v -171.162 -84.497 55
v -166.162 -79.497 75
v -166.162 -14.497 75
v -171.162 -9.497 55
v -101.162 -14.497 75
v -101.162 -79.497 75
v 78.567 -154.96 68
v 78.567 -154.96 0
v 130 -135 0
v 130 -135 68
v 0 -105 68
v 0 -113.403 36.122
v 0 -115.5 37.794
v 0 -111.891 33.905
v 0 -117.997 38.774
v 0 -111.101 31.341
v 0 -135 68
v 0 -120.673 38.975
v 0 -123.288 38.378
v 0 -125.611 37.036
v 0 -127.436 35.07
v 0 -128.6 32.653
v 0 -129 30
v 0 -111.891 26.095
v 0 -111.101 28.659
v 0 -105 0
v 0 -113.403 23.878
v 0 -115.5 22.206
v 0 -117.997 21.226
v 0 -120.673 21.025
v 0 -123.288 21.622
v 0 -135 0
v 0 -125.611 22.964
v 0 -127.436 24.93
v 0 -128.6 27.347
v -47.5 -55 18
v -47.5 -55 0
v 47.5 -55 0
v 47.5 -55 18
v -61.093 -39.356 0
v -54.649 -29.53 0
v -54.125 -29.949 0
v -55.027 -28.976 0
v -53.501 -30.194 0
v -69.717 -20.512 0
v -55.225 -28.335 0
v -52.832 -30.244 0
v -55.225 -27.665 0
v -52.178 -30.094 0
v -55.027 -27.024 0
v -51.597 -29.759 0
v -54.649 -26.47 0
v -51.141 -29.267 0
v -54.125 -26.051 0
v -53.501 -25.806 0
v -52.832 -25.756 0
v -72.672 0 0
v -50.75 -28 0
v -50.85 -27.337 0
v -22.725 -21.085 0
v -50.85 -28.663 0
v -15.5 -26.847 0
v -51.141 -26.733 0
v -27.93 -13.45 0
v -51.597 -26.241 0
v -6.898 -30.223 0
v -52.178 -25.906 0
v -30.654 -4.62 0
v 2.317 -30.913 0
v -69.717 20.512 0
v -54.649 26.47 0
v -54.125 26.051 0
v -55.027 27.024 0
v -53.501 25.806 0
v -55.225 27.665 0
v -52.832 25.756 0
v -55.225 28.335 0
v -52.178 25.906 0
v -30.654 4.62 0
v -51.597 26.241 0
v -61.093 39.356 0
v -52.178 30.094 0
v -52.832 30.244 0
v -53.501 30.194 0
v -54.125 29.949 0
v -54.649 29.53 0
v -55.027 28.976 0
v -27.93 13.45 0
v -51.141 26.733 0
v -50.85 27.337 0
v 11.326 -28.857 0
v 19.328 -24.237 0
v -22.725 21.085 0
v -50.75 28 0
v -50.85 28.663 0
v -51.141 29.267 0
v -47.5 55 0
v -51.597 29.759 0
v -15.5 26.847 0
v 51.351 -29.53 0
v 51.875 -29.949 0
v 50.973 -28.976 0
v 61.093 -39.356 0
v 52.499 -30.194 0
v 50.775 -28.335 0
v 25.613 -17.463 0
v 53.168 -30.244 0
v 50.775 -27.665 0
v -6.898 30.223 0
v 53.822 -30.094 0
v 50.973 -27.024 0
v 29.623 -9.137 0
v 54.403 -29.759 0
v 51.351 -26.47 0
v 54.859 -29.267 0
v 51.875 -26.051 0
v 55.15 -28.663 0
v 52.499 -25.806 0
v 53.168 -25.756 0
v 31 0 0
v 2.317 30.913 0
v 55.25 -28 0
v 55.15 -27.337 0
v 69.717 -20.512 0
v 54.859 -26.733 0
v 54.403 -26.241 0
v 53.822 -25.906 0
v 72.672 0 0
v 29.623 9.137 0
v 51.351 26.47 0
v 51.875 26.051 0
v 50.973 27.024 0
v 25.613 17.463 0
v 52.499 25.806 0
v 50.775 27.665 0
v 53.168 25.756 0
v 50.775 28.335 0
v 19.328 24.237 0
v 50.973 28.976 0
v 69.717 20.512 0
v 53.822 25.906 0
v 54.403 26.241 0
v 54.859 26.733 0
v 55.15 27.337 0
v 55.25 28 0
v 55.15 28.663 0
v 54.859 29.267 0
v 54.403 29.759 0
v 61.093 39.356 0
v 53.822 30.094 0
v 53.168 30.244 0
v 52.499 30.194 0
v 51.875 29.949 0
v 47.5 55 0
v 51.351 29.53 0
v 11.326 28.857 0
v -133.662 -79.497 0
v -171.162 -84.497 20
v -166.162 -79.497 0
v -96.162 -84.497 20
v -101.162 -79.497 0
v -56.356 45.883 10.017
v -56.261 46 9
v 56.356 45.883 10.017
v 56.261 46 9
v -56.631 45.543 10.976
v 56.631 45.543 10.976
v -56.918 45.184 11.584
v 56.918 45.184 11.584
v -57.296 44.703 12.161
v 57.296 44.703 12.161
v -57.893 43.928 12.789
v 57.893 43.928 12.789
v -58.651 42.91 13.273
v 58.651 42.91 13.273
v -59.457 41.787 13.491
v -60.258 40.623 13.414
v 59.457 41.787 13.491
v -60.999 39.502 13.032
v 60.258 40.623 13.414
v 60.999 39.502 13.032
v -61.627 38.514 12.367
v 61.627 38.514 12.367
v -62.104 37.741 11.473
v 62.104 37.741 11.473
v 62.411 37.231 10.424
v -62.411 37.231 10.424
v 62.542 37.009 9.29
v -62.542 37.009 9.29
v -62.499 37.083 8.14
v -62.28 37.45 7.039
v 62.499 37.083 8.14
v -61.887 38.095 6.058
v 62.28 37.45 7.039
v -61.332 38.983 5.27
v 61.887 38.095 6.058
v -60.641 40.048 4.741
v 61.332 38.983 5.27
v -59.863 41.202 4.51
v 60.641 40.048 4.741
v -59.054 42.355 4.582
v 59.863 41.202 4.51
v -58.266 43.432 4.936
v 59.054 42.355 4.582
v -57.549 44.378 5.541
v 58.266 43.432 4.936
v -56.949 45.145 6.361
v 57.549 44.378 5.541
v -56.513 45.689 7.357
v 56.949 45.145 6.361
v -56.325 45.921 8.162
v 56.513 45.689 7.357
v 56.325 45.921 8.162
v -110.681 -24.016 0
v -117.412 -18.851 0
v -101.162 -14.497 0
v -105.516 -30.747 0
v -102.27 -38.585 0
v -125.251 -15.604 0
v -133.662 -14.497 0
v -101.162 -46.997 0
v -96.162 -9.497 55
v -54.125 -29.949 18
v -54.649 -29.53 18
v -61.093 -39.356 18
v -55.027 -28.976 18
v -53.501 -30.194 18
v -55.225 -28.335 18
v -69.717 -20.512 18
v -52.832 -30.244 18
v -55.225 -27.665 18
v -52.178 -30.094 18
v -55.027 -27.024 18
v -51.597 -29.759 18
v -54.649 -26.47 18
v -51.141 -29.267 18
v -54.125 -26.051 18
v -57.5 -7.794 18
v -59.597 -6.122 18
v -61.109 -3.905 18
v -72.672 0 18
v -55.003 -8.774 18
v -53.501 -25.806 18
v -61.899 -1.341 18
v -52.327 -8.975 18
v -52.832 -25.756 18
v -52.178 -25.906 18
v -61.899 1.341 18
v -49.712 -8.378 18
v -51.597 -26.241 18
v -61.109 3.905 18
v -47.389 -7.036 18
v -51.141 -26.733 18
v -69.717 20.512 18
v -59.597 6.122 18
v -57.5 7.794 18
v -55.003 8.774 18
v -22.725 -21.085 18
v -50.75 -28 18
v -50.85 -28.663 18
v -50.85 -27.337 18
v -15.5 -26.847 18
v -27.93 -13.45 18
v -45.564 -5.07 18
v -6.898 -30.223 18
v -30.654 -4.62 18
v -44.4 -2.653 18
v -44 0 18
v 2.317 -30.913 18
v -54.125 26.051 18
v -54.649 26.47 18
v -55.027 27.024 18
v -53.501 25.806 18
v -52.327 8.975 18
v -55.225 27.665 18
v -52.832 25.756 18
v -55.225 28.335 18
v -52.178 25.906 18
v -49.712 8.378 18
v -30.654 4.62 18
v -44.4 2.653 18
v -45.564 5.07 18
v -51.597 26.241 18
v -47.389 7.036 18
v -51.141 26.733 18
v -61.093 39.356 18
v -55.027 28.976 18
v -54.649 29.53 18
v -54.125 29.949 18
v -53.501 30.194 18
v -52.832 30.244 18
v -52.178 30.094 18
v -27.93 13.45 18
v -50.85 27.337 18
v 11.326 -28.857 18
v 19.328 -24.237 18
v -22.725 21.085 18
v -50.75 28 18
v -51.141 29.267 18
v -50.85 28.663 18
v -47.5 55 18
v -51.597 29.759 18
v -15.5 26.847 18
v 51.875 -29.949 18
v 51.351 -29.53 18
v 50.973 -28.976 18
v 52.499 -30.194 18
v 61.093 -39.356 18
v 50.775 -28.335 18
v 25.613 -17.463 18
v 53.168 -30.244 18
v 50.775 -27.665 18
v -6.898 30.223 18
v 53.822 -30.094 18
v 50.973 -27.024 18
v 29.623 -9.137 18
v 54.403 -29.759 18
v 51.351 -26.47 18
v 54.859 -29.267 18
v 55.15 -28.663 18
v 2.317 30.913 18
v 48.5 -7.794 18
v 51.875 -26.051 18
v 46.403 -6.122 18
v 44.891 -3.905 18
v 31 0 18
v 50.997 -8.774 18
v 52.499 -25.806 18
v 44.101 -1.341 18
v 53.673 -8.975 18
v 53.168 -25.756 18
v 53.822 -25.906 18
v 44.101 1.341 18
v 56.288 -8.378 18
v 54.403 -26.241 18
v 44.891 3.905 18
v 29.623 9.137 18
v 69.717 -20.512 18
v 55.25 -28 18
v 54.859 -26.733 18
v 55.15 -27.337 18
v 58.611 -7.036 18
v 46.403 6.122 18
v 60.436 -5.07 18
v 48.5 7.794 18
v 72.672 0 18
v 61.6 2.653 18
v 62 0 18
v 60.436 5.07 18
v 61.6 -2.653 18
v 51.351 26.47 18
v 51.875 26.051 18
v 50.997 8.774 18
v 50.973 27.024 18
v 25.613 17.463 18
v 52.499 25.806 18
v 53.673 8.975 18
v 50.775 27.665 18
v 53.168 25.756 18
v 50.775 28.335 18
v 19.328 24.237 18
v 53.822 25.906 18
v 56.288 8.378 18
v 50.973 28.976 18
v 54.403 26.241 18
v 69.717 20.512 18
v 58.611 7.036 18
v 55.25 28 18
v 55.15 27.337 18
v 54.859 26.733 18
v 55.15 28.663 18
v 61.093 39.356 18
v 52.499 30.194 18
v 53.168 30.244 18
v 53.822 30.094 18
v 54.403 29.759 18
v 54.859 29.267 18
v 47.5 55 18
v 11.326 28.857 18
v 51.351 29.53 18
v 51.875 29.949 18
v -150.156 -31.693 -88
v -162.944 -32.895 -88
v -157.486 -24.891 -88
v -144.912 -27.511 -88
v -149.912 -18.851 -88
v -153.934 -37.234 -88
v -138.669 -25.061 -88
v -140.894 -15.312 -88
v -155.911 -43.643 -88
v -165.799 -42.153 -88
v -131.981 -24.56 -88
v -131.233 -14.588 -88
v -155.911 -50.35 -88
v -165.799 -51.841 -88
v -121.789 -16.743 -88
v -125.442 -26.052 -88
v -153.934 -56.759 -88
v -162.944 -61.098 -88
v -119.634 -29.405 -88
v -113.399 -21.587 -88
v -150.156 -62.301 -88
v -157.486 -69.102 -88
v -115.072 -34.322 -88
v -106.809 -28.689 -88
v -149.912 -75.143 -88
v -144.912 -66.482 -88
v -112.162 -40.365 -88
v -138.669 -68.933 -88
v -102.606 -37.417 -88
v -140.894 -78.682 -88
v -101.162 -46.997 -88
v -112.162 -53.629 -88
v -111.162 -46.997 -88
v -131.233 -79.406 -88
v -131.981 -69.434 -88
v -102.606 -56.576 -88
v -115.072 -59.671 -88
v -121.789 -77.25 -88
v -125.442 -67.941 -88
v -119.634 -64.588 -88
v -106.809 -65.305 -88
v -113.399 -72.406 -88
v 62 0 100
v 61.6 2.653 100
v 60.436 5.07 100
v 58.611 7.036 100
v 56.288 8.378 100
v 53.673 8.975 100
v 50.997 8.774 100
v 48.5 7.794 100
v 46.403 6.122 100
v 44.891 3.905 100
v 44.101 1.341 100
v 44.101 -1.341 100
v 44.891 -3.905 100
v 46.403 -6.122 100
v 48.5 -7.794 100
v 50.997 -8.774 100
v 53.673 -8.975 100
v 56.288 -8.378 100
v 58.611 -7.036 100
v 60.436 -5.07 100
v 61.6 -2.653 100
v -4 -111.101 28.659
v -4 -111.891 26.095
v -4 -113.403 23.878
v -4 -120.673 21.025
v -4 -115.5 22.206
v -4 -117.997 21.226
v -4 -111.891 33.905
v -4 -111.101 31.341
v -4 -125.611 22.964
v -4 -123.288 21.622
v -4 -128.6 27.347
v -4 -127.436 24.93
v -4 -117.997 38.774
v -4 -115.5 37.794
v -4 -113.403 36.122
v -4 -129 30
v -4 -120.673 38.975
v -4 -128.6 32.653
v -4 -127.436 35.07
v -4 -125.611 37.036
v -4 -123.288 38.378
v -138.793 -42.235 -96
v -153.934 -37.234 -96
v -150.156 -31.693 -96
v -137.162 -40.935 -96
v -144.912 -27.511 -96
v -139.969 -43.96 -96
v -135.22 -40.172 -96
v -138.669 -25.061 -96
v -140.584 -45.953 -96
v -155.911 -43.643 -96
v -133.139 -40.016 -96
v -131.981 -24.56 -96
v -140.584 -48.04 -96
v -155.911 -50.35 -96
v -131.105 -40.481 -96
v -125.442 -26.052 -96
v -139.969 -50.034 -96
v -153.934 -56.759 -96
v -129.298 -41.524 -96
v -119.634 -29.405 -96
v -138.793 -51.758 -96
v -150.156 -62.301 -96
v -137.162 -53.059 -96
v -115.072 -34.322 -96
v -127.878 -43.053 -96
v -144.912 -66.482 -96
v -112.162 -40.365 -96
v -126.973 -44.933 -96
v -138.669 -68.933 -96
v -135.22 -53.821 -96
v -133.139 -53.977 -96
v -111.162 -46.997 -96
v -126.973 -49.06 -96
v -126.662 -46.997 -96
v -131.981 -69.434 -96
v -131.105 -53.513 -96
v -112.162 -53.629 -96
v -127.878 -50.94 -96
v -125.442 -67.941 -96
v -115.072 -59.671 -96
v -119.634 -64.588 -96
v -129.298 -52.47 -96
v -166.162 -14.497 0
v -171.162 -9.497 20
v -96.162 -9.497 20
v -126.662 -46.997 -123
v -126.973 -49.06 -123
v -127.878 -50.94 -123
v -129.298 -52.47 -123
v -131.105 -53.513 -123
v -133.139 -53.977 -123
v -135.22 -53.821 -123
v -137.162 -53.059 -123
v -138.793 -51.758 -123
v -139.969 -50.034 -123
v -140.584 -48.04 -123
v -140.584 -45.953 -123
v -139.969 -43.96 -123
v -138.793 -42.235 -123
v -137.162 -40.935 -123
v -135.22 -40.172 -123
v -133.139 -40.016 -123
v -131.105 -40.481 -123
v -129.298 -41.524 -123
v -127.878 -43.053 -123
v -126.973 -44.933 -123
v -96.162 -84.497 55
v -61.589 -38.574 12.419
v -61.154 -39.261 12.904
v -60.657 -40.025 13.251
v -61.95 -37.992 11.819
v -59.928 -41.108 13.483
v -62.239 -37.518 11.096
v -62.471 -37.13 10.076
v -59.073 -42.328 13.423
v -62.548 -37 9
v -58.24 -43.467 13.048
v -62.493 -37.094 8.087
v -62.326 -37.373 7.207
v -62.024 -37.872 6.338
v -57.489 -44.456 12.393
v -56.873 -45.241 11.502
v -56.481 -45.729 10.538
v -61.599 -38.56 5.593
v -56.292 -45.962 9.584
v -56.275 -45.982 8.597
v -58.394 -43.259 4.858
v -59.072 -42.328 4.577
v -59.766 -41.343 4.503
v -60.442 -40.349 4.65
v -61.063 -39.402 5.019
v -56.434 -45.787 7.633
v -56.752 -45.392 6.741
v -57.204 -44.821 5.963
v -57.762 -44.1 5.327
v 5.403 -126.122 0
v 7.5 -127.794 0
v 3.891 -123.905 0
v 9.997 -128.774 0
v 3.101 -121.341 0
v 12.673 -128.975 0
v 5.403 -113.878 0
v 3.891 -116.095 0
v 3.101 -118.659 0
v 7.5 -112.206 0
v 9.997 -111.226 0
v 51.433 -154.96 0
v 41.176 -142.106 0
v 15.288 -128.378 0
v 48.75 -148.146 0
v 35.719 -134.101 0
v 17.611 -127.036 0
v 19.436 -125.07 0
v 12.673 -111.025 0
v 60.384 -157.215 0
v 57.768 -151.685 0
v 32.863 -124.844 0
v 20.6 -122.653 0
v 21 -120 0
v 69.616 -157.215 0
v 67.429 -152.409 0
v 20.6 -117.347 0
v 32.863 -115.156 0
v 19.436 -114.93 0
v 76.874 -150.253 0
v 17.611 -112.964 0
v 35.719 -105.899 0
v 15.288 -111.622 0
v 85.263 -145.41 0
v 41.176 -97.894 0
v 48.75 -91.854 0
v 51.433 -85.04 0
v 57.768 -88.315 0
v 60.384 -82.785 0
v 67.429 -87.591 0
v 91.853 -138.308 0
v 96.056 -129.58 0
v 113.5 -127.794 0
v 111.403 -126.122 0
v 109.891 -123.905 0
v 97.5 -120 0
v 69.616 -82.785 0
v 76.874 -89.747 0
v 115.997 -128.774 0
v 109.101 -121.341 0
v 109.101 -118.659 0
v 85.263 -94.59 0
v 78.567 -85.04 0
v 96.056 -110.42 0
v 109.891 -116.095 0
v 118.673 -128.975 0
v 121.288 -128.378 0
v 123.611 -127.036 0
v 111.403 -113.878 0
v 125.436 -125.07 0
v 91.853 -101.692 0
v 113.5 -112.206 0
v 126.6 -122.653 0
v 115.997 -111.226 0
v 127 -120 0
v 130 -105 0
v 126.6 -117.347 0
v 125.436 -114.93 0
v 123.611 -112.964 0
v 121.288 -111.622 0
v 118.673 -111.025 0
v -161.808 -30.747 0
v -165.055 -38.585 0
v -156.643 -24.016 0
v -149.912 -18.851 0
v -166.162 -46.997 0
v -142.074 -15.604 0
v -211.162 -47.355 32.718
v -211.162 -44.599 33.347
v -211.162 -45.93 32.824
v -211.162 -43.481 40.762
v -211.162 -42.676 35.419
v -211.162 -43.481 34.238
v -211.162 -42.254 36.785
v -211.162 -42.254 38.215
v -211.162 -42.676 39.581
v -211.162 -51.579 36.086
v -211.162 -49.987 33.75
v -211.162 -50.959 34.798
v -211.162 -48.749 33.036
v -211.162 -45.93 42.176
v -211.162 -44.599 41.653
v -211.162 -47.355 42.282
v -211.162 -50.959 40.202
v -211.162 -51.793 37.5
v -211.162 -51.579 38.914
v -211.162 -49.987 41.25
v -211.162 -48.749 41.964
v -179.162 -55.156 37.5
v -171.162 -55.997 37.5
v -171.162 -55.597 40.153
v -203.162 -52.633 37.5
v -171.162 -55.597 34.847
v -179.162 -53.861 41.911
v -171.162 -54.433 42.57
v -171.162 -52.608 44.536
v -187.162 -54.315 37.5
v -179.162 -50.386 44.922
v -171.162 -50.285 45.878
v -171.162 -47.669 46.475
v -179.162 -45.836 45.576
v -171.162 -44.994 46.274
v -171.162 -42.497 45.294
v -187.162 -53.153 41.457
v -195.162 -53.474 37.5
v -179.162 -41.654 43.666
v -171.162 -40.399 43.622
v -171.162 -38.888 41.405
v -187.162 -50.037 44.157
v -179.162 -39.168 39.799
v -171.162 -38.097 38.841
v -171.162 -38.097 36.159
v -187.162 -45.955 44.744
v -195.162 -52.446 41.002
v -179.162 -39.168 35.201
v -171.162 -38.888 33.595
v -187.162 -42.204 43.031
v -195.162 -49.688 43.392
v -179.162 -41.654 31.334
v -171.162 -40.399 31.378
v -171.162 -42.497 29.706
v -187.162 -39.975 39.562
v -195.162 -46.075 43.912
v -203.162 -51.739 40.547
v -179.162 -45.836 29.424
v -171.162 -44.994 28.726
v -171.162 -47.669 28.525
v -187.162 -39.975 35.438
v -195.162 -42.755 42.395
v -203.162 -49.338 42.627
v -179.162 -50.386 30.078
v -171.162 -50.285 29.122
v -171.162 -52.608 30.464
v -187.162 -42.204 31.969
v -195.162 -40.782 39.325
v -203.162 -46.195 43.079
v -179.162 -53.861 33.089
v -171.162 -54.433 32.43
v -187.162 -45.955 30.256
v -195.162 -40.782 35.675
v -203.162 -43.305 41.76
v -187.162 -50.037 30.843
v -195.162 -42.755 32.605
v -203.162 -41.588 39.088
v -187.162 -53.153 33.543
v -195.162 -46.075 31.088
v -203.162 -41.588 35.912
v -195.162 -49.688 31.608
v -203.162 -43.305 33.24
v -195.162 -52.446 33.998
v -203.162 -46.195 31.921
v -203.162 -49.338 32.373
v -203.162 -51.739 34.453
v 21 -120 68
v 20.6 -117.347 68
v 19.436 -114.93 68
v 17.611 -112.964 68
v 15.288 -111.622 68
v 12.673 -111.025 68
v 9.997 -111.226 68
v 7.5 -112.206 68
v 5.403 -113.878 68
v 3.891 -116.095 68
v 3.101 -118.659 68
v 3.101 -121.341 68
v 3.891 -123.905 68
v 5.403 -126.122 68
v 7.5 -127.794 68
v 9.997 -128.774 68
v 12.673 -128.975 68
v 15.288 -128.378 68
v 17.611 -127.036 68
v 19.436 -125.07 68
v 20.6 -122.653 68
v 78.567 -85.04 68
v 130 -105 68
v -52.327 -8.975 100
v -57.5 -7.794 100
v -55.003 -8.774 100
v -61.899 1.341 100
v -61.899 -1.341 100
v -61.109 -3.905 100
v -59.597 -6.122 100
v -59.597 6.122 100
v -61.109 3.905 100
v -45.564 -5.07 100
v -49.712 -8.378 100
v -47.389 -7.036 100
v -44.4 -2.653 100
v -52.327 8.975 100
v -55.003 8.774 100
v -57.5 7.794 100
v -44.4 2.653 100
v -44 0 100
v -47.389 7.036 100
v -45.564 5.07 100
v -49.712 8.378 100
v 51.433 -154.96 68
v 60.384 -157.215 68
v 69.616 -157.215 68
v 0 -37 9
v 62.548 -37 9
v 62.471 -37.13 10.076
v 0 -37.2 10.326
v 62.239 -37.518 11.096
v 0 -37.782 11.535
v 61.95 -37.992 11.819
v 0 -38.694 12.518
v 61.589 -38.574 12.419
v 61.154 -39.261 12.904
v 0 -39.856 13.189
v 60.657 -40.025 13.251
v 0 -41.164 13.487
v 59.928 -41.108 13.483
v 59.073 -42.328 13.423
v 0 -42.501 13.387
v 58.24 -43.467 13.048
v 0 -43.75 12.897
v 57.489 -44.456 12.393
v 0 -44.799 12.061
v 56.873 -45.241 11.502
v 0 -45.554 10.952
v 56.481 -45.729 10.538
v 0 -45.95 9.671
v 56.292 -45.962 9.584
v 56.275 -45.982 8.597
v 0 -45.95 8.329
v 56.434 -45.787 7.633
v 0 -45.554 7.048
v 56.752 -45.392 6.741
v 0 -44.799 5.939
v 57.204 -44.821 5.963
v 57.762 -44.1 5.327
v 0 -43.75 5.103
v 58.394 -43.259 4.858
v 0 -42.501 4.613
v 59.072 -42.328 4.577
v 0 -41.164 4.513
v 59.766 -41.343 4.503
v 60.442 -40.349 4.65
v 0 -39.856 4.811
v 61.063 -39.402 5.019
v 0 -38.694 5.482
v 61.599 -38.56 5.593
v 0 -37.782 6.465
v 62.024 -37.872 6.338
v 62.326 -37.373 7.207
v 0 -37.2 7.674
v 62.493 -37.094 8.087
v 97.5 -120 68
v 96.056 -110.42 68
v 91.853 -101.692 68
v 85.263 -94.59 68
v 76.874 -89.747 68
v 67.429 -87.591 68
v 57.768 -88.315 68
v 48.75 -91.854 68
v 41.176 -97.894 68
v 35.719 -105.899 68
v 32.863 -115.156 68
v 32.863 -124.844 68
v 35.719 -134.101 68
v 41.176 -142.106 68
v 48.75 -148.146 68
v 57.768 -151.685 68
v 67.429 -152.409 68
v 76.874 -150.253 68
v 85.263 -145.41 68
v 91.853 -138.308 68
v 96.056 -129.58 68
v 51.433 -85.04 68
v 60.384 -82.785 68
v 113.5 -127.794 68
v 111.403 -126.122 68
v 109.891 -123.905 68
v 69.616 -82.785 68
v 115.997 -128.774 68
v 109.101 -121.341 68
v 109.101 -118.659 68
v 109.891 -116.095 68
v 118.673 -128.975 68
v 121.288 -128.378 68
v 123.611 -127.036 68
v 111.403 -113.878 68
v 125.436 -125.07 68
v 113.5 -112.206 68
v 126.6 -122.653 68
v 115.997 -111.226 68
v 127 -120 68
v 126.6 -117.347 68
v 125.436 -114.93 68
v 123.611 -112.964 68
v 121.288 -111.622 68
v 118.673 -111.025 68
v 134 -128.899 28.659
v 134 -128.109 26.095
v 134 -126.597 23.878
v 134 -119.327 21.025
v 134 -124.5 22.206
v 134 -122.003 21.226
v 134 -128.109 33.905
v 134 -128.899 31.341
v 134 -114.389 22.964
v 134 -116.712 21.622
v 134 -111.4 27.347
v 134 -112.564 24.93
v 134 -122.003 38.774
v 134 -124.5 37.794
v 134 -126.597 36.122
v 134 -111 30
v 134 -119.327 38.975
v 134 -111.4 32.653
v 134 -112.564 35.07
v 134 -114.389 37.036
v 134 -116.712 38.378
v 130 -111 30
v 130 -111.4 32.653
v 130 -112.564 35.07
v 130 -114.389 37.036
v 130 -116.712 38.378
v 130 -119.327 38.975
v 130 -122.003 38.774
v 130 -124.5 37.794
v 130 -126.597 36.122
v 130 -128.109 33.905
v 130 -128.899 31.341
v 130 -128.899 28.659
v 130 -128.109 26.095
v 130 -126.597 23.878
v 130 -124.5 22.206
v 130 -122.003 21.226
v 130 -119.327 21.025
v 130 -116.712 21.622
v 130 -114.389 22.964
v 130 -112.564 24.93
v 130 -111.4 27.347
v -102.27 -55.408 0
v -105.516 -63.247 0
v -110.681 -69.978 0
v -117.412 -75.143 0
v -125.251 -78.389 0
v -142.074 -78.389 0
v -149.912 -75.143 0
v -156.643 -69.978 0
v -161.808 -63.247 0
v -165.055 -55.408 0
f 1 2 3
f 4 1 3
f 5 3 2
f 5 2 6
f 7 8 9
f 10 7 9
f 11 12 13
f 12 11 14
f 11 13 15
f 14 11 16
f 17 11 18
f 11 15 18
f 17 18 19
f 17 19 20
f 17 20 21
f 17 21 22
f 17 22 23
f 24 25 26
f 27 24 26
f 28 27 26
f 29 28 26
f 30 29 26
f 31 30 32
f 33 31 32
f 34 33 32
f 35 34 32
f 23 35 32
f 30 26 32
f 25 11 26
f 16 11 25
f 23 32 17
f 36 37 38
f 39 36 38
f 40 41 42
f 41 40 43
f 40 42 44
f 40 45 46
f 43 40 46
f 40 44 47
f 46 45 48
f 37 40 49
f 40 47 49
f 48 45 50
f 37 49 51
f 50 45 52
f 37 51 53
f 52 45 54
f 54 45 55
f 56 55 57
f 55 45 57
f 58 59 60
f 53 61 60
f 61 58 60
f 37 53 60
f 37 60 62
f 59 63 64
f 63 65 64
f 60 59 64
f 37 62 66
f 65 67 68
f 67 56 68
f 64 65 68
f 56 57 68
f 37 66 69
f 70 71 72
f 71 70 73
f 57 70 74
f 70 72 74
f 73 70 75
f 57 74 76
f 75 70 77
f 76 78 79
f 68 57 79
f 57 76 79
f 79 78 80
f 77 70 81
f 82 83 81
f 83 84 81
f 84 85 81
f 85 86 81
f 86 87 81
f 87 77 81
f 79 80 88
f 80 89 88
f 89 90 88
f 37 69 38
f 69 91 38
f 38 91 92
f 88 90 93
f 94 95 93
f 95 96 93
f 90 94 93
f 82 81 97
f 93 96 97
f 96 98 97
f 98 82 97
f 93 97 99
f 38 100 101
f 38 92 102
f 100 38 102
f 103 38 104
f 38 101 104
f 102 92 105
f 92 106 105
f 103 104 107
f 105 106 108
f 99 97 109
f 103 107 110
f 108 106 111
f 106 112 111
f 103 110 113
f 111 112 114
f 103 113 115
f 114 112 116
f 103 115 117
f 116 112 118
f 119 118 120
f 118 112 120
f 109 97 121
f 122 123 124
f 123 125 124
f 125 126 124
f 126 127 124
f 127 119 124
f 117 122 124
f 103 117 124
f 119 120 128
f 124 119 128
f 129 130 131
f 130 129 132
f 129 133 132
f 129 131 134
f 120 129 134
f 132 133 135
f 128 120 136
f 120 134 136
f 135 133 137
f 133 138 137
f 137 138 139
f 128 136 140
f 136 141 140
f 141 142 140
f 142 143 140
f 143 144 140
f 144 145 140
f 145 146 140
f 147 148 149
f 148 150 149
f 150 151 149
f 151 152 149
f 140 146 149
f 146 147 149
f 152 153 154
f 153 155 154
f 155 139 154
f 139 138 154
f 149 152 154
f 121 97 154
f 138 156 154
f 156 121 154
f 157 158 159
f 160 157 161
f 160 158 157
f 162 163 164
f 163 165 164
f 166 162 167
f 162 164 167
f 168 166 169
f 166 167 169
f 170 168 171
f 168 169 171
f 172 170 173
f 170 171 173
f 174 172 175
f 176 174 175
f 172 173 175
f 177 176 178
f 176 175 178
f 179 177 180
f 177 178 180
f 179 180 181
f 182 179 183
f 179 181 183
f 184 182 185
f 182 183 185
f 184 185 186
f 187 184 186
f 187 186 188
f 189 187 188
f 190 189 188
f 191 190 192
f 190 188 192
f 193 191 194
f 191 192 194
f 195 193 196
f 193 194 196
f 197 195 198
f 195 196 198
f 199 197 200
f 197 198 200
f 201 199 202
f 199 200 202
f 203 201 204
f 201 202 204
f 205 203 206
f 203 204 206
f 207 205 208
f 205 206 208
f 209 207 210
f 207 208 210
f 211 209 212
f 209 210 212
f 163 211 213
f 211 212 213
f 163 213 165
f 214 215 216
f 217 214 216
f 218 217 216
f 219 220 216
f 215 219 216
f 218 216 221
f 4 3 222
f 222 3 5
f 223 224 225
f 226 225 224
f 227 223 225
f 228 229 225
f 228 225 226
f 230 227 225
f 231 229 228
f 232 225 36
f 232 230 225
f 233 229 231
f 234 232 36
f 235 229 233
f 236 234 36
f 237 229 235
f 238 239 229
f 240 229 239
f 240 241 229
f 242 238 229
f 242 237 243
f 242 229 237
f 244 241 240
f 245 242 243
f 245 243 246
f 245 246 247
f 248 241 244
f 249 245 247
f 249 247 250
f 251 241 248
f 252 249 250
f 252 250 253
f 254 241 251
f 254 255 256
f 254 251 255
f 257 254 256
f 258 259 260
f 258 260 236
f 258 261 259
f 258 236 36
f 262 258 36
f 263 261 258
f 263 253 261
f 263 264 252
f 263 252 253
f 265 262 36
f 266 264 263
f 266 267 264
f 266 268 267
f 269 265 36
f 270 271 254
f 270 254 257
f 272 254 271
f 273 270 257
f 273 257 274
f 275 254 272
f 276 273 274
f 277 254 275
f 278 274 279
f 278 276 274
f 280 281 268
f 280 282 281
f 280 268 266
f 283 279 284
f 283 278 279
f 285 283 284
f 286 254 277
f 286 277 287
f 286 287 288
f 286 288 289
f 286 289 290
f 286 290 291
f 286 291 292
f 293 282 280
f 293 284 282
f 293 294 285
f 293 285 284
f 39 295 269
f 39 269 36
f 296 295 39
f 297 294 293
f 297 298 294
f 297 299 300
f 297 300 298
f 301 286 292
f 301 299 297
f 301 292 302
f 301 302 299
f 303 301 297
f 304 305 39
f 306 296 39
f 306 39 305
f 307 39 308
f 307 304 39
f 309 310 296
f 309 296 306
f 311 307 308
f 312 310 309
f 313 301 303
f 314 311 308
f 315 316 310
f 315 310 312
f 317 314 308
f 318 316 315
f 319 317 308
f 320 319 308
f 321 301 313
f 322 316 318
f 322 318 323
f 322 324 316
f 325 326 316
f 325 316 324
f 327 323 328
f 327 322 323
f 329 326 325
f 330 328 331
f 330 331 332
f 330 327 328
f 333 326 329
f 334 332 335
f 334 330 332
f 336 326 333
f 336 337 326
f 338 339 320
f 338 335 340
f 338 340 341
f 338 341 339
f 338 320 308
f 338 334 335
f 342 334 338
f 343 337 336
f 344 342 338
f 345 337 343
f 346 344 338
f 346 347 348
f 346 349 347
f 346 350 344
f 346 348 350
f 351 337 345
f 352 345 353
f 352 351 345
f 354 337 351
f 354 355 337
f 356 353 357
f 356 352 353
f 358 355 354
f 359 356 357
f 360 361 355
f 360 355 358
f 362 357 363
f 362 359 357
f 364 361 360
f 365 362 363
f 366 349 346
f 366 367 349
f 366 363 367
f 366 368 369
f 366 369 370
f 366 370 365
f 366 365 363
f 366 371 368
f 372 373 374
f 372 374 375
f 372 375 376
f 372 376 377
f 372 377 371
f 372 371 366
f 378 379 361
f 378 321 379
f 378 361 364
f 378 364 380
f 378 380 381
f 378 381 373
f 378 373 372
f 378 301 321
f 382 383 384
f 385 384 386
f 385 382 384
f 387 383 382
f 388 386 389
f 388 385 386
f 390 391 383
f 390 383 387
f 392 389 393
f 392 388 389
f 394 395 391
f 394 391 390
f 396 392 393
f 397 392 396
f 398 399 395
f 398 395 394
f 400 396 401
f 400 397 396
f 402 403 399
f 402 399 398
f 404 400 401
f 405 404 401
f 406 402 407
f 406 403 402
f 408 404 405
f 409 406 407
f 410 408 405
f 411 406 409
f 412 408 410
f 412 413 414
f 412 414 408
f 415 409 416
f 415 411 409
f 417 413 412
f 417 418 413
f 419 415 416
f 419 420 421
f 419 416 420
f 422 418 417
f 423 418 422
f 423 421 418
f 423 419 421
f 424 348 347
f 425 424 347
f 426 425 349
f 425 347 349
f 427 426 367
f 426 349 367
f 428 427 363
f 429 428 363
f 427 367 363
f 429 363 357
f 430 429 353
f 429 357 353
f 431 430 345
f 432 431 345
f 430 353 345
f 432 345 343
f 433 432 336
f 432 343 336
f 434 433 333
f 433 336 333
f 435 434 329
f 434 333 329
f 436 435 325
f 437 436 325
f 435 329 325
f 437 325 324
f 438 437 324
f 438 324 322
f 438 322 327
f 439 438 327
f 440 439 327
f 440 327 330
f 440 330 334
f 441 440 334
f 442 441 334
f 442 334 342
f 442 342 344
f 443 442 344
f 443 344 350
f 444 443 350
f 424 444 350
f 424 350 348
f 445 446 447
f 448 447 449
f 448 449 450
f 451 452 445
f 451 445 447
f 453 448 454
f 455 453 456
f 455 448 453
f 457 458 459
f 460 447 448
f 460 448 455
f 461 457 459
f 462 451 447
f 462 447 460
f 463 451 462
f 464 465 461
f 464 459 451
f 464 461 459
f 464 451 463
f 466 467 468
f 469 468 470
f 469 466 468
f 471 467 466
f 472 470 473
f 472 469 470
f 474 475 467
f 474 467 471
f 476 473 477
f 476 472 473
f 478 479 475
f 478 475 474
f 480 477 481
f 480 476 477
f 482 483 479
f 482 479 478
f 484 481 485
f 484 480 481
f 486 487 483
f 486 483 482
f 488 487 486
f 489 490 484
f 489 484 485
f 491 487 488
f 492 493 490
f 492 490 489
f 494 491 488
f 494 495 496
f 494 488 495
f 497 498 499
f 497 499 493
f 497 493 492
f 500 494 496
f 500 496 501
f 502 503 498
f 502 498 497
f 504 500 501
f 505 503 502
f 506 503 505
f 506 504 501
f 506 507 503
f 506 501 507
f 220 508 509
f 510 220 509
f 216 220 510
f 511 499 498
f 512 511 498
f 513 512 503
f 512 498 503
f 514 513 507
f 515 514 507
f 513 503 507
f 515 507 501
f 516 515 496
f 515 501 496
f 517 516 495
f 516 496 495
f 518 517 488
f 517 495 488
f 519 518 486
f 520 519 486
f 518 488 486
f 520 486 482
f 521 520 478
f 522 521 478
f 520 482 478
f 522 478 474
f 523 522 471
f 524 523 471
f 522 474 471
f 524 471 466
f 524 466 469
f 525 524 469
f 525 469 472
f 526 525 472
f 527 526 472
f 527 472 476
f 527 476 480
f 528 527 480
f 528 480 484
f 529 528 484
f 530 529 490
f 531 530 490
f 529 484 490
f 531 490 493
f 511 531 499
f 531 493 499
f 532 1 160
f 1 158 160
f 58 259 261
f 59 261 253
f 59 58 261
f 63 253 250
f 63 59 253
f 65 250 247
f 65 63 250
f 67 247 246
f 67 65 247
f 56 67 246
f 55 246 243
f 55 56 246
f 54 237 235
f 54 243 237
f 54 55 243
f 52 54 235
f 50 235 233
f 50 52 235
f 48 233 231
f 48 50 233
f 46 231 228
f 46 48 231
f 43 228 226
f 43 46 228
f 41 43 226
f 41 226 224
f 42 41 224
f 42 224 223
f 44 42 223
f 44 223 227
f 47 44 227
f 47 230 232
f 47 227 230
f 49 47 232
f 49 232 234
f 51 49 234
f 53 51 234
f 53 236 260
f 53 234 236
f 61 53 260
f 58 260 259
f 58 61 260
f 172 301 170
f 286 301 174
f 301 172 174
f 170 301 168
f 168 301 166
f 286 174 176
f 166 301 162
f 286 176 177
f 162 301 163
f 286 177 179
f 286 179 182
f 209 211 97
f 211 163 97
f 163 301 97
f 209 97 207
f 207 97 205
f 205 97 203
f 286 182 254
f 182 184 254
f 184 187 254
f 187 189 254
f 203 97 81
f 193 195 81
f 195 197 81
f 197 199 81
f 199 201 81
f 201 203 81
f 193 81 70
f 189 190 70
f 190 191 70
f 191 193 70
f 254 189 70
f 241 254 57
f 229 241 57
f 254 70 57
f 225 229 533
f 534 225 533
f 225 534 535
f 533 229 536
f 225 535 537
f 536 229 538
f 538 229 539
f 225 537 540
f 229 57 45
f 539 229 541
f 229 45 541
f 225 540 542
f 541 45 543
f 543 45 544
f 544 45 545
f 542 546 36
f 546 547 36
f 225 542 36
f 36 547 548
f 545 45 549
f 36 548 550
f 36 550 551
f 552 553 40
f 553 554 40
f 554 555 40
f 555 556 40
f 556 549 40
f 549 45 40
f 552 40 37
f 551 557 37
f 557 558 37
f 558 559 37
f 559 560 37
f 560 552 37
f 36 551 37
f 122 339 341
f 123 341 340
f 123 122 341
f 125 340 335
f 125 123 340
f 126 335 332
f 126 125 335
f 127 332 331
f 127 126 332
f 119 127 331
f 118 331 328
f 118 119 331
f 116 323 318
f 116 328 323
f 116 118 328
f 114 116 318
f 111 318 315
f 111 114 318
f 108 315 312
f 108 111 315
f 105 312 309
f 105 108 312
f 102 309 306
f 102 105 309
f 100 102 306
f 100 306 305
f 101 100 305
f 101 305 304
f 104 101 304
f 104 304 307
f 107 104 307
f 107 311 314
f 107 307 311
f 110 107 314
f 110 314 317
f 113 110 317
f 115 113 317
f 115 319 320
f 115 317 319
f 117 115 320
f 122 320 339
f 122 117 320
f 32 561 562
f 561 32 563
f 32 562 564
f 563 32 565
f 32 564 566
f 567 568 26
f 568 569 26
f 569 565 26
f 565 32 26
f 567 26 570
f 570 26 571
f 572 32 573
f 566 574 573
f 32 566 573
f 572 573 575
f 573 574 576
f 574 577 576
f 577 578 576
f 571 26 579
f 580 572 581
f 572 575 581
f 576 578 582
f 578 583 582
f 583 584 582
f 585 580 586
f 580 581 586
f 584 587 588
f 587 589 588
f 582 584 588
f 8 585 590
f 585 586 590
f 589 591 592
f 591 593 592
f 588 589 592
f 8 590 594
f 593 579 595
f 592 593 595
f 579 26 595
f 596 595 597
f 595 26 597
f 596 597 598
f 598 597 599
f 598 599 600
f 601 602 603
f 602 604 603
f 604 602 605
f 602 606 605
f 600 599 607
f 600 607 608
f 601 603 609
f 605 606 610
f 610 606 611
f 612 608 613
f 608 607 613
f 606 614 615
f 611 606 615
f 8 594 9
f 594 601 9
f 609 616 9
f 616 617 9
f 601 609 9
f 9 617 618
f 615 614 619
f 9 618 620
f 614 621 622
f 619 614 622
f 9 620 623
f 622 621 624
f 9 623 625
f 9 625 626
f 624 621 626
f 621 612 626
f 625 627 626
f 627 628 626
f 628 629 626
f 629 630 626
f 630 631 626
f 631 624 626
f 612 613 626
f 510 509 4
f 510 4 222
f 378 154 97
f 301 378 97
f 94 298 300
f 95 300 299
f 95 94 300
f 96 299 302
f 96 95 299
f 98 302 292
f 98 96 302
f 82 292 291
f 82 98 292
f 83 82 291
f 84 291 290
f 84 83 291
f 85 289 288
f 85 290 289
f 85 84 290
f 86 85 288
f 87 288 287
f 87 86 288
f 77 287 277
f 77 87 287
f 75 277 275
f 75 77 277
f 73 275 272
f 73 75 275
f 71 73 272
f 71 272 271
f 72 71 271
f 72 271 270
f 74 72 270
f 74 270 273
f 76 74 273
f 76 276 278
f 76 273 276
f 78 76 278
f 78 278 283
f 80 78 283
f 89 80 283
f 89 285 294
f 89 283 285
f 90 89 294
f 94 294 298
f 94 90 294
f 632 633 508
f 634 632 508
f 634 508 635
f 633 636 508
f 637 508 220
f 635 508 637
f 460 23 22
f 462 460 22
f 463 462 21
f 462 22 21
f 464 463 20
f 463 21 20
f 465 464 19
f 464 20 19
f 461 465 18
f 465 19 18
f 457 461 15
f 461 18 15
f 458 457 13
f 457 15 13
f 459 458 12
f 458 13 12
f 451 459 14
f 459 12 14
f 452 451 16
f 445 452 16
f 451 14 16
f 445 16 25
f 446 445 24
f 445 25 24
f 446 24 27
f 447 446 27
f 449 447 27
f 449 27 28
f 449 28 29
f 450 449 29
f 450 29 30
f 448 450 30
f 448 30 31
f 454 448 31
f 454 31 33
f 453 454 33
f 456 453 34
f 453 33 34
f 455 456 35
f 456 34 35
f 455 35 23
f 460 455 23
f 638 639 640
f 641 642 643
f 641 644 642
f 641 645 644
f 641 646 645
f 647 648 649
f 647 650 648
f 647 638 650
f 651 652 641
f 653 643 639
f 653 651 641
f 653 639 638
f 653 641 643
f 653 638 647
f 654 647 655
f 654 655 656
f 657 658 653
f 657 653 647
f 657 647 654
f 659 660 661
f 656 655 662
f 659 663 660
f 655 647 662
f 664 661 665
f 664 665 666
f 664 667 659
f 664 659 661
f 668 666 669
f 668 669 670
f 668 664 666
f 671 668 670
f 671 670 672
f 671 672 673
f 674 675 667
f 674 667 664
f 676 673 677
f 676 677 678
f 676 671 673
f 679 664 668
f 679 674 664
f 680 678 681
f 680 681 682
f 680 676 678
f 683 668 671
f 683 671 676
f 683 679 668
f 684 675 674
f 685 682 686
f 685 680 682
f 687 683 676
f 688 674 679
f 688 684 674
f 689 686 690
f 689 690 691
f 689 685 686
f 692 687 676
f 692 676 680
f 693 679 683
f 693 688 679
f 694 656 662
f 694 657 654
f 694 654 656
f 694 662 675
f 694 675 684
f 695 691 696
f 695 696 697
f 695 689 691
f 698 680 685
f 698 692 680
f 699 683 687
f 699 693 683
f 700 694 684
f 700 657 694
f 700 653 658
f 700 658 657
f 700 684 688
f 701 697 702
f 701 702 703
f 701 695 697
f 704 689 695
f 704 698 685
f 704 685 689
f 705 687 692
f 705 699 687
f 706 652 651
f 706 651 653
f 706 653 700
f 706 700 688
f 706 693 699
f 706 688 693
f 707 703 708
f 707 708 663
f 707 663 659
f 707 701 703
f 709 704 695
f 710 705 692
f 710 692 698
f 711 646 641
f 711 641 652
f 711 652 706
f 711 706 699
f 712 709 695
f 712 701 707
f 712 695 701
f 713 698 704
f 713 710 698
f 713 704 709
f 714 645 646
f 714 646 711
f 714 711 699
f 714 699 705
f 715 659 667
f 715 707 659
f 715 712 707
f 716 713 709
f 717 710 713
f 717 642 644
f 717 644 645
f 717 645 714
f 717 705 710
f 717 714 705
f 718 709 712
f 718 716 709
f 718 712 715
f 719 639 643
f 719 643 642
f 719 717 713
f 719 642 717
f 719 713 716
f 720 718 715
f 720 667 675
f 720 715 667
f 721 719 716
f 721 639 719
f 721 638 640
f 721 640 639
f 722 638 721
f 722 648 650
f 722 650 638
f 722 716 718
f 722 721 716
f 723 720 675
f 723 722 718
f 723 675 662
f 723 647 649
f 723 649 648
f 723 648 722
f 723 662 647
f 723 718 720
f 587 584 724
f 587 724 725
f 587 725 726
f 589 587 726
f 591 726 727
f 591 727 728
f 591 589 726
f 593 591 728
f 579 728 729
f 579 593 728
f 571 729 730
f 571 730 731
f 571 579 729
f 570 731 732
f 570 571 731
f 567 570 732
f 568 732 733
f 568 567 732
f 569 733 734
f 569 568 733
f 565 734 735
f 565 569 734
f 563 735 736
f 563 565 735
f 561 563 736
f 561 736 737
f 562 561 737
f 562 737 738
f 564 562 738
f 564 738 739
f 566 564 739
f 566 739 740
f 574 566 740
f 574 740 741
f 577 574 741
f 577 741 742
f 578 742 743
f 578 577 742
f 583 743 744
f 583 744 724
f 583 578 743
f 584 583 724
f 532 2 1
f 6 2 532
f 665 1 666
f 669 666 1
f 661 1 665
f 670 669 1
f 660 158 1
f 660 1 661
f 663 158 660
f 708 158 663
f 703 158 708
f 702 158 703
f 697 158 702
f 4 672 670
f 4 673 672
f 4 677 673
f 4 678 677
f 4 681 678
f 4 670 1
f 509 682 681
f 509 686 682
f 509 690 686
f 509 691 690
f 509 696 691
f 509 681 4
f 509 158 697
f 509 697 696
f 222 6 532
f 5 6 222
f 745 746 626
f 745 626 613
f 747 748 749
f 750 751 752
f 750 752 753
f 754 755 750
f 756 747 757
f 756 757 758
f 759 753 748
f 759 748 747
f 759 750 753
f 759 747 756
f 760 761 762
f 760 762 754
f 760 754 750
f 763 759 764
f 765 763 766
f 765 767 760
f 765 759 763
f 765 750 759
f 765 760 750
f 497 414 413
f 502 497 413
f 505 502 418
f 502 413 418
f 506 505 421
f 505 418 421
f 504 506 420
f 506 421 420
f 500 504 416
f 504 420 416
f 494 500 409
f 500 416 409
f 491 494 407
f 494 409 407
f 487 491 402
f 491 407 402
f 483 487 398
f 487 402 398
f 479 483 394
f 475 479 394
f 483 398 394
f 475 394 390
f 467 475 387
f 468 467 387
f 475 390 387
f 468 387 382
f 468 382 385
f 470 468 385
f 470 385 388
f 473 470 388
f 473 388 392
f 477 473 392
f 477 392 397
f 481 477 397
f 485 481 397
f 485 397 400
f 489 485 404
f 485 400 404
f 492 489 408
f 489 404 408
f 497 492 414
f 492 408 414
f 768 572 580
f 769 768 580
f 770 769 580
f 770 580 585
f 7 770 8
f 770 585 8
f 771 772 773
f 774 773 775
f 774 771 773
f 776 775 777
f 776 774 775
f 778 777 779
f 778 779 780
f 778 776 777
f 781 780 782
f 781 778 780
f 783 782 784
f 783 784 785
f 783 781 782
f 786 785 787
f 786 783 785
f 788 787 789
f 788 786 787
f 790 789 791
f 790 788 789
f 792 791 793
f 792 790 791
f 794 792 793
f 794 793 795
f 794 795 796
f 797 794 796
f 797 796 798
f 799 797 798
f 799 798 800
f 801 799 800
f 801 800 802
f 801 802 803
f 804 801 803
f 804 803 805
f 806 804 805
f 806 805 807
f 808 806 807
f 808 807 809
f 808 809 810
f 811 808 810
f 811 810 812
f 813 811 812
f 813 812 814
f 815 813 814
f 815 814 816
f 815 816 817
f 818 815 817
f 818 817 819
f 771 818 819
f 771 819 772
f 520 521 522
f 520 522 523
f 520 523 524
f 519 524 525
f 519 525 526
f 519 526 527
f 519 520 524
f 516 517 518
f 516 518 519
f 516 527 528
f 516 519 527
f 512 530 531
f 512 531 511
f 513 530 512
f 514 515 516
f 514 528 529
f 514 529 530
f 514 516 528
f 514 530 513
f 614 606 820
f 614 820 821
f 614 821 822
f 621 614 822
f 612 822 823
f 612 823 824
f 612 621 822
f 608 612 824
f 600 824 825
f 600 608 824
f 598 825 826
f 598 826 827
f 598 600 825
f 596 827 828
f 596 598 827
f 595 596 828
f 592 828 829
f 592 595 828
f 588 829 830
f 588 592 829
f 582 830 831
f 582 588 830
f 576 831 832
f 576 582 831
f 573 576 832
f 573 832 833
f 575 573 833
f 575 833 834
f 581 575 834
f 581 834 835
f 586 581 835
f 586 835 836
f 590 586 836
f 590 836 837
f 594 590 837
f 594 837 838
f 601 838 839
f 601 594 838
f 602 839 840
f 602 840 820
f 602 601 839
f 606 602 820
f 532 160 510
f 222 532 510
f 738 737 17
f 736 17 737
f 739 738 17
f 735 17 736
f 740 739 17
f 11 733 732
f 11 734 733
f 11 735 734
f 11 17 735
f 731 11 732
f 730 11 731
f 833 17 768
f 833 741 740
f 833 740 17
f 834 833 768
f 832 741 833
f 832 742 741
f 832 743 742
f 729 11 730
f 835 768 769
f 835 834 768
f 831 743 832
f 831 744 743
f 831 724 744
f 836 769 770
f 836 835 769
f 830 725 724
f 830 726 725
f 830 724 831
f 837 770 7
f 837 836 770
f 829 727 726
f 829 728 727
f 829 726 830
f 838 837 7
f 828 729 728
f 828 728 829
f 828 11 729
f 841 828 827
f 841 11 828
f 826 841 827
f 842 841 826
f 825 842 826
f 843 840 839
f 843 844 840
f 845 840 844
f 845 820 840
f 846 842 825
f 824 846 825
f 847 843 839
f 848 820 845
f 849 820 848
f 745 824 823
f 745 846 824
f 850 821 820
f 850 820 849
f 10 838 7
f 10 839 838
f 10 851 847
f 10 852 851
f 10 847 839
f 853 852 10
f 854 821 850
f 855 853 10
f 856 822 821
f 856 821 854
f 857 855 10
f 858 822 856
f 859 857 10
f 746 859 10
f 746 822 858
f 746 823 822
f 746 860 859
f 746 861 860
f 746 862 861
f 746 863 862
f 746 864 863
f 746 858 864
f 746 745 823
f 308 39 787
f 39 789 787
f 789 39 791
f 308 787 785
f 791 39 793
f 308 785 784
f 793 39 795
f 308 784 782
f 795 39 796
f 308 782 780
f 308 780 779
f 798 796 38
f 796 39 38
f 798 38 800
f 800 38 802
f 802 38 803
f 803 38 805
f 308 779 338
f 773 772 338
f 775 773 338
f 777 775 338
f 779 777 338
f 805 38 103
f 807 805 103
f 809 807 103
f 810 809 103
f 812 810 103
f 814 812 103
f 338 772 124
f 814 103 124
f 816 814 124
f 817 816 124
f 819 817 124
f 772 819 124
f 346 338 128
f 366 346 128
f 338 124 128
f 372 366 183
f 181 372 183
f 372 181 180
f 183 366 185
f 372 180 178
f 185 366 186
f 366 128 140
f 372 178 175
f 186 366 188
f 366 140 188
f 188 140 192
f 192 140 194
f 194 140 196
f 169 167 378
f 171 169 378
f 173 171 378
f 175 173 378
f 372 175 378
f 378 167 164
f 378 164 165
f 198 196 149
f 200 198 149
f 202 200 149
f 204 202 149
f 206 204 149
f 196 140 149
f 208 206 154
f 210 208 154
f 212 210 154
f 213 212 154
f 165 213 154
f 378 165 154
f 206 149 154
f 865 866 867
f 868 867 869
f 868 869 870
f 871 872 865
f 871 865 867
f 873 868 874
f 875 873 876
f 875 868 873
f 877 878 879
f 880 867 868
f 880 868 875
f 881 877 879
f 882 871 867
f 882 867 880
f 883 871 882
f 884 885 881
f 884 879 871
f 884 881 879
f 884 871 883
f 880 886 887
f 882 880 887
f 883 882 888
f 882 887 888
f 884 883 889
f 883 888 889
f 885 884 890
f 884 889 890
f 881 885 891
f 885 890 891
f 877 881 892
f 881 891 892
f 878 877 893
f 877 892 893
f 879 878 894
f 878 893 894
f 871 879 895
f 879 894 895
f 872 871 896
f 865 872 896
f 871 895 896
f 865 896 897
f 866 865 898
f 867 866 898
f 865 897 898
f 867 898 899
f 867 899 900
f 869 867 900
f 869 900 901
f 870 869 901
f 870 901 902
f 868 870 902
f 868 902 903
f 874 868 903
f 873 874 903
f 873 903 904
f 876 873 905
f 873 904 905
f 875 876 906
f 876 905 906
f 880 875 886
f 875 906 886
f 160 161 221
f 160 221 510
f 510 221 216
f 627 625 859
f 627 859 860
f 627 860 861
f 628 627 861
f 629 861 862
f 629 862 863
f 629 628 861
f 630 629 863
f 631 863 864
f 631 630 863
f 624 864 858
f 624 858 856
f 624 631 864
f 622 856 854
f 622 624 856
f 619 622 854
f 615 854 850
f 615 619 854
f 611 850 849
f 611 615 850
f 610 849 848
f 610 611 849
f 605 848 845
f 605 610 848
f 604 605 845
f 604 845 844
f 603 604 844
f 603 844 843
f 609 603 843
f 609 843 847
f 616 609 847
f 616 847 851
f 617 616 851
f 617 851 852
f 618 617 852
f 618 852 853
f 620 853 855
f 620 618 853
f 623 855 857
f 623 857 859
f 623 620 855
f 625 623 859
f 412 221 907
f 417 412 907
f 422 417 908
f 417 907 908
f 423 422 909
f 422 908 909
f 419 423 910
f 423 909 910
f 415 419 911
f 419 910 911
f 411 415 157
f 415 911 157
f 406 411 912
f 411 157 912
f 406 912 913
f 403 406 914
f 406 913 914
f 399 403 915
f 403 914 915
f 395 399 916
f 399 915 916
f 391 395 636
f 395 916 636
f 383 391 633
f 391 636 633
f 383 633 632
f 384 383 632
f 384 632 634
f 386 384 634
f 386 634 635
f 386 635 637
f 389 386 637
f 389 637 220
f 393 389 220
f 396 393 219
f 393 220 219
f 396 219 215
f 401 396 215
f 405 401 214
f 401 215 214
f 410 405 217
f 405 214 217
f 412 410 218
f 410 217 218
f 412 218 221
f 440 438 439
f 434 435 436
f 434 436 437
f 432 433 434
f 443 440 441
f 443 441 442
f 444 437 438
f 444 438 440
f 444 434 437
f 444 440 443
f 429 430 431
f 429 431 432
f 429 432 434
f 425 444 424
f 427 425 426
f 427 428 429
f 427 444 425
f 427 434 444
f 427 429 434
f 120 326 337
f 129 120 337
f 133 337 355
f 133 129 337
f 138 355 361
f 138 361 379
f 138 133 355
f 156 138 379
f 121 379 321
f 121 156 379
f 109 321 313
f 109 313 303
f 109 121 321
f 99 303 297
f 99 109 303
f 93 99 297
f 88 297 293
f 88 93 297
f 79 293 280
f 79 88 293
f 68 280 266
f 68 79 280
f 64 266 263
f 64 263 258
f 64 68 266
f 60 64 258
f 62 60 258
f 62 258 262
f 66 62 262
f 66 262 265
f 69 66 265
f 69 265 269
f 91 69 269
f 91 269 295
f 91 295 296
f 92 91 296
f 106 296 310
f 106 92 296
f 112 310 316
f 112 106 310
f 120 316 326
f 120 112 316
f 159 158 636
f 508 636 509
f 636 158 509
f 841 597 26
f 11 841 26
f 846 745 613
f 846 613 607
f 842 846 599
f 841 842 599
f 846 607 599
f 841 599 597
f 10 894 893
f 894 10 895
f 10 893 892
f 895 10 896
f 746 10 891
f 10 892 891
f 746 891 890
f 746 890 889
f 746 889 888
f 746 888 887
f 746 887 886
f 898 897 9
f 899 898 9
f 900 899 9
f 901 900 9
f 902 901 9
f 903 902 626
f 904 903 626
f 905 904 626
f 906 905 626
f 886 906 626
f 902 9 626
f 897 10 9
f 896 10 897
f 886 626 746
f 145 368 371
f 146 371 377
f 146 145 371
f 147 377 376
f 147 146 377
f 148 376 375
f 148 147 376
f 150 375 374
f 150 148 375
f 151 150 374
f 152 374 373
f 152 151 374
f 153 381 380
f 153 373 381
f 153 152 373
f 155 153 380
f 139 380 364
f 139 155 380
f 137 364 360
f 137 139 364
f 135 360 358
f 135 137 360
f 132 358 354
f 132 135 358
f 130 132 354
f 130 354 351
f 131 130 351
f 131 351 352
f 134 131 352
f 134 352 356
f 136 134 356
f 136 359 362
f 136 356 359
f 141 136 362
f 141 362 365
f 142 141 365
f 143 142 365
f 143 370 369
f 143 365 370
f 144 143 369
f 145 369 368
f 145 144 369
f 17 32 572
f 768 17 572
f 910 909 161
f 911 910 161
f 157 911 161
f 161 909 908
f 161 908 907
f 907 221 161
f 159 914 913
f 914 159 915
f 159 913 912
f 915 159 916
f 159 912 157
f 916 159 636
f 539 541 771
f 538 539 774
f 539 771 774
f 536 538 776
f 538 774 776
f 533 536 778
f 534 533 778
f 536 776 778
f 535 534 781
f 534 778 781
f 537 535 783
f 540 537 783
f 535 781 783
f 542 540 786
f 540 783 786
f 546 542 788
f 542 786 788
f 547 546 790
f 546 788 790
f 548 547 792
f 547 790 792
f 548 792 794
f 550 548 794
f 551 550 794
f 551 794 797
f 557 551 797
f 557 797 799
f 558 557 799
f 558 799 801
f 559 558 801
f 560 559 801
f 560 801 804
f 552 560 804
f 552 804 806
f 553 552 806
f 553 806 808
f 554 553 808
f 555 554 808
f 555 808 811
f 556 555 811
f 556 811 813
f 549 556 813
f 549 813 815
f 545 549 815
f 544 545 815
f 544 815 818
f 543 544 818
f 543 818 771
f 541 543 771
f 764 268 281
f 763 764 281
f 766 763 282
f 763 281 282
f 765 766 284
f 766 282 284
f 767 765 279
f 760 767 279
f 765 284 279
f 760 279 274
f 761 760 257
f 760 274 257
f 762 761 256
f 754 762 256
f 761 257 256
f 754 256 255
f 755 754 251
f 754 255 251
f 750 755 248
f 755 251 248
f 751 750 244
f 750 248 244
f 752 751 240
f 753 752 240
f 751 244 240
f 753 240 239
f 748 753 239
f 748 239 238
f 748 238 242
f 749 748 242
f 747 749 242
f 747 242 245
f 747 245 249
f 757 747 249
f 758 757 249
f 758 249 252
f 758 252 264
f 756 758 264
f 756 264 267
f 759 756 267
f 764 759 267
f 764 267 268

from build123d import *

# Parameters (mm, degrees)
F0_R         = 9
F0_R_2       = 31
F1_DEPTH     = 18
F2_DEPTH     = 100
F3_R         = 4.5
F4_DEPTH     = 100
F5_R         = 9
F5_R_2       = 32.5
F6_DEPTH     = 68
F7_R         = 9
F8_DEPTH     = 4
F9_R         = 9
F10_DEPTH    = 4
F16_W        = 75
F16_H        = 75
F17_DEPTH    = 75
F18_SIZE2    = 5
F18_SIZE     = 20
F19_C1_SIZE2 = 5
F19_C1_SIZE  = 20
F19_C2_SIZE2 = 5
F19_C2_SIZE  = 20
F19_C3_SIZE2 = 5
F19_C3_SIZE  = 20
F19_C4_SIZE2 = 20
F19_C4_SIZE  = 5
F19_C5_SIZE2 = 20
F19_C5_SIZE  = 5
F19_C6_SIZE2 = 5
F19_C6_SIZE  = 20
F19_C7_SIZE2 = 5
F19_C7_SIZE  = 20
F20_R        = 9
F21_DEPTH    = 40
F21_TAPER    = 6
F22_R        = 32.5
F23_DEPTH    = 88
F24_R        = 22.5
F25_DEPTH    = 8
F26_R        = 7
F27_DEPTH    = 27
F28_R        = 2.25
F29_DEPTH    = 25


# Not quite as in the source:
# - a feature of the source that left no trace in its solid (it failed there, or was rolled back) is left out


with BuildPart() as f1:
    # F0 (on Top) → F1 (new body)
    with BuildSketch(Plane.XY):
        with BuildLine():
            Line((47.5, 55), (-47.5, 55))
            ThreePointArc((-47.5, 55), (-72.6722092687, 0), (-47.5, -55))
            Line((-47.5, -55), (47.5, -55))
            ThreePointArc((47.5, -55), (72.6722092687, 0), (47.5, 55))
        make_face()
        with Locations((-53, 0)):
            Circle(F0_R, mode=Mode.SUBTRACT)
        Circle(F0_R_2, mode=Mode.SUBTRACT)
        with Locations((53, 0)):
            Circle(F0_R, mode=Mode.SUBTRACT)
    extrude(amount=F1_DEPTH)

    # F0 (on Top) → F2 (join)
    with BuildSketch(Plane.XY):
        with Locations((-53, 0)):
            Circle(F0_R)
        with Locations((53, 0)):
            Circle(F0_R)
    extrude(amount=F2_DEPTH)

    # F3 (on Right) → F4 (cut, symmetric)
    with BuildSketch(Plane.YZ):
        with Locations((-41.5, 9)):
            Circle(F3_R)
        with Locations((41.5, 9)):
            Circle(F3_R)
    extrude(amount=F4_DEPTH, both=True, mode=Mode.SUBTRACT)

    # F28 (on face) → F29 (cut)
    with BuildSketch(Plane.XY):
        with Locations((-53, 28)):
            Circle(F28_R)
        with Locations((-53, -28)):
            Circle(F28_R)
        with Locations((53, -28)):
            Circle(F28_R)
        with Locations((53, 28)):
            Circle(F28_R)
    extrude(amount=F29_DEPTH, mode=Mode.SUBTRACT)


with BuildPart() as f6:
    # F5 (on Top) → F6 (new body)
    with BuildSketch(Plane.XY):
        with BuildLine():
            Line((0, -105), (0, -135))
            Line((0, -135), (51.4330297899, -154.9597957562))
            ThreePointArc((51.4330297899, -154.9597957562), (65, -157.5), (78.5669702101, -154.9597957562))
            Line((78.5669702101, -154.9597957562), (130, -135))
            Line((130, -135), (130, -105))
            Line((130, -105), (78.5669702101, -85.0402042438))
            ThreePointArc((78.5669702101, -85.0402042438), (65, -82.5), (51.4330297899, -85.0402042438))
            Line((51.4330297899, -85.0402042438), (0, -105))
        make_face()
        with Locations((12, -120)):
            Circle(F5_R, mode=Mode.SUBTRACT)
        with Locations((65, -120)):
            Circle(F5_R_2, mode=Mode.SUBTRACT)
        with Locations((118, -120)):
            Circle(F5_R, mode=Mode.SUBTRACT)
    extrude(amount=F6_DEPTH)

    # F7 (on face) → F8 (join)
    with BuildSketch(Plane.YZ.offset(130)):
        with Locations((-120, 30)):
            Circle(F7_R)
    extrude(amount=F8_DEPTH)

    # F9 (on face) → F10 (join)
    with BuildSketch(Plane(origin=(0, 0, 0), x_dir=(0, -1, 0), z_dir=(-1, 0, 0))):
        with Locations((120, 30)):
            Circle(F9_R)
    extrude(amount=F10_DEPTH)


with BuildPart() as f17:
    # F16 (on Top) → F17 (new body)
    with BuildSketch(Plane.XY):
        with Locations((-133.6621306837, -46.9966906275)):
            Rectangle(F16_W, F16_H)
    extrude(amount=F17_DEPTH)

    # F18
    f18_edges = [f17.edges().sort_by_distance(p)[0] for p in [
        (-96.162131, -46.996691, 75),
    ]]
    f18_side = f17.faces().sort_by_distance((-96.162131, -46.996691, 37.5))[0]
    chamfer(f18_edges, length=F18_SIZE, length2=F18_SIZE2, reference=f18_side)

    # F19: chamfer of 20 x 5 on 7 edges, made by hand

    # F19_c1
    f19_c1_edges = [f17.edges().sort_by_distance(p)[0] for p in [
        (-133.6621306837, -9.4966906275, 0),
    ]]
    f19_c1_side = f17.faces().sort_by_distance((-133.6621306837, -9.4966906275, 0.1))[0]
    chamfer(f19_c1_edges, length=F19_C1_SIZE, length2=F19_C1_SIZE2, reference=f19_c1_side)

    # F19_c2
    f19_c2_edges = [f17.edges().sort_by_distance(p)[0] for p in [
        (-136.1621306837, -9.4966906275, 75),
    ]]
    f19_c2_side = f17.faces().sort_by_distance((-136.1621306837, -9.4966906275, 74.9))[0]
    chamfer(f19_c2_edges, length=F19_C2_SIZE, length2=F19_C2_SIZE2, reference=f19_c2_side)

    # F19_c3
    f19_c3_edges = [f17.edges().sort_by_distance(p)[0] for p in [
        (-96.1621306837, -49.4966906275, 0),
    ]]
    f19_c3_side = f17.faces().sort_by_distance((-96.1621306837, -49.4966906275, 0.1))[0]
    chamfer(f19_c3_edges, length=F19_C3_SIZE, length2=F19_C3_SIZE2, reference=f19_c3_side)

    # F19_c4
    f19_c4_edges = [f17.edges().sort_by_distance(p)[0] for p in [
        (-171.1621306837, -49.4966906275, 0),
    ]]
    f19_c4_side = f17.faces().sort_by_distance((-171.0621306837, -49.4966906275, 0))[0]
    chamfer(f19_c4_edges, length=F19_C4_SIZE, length2=F19_C4_SIZE2, reference=f19_c4_side)

    # F19_c5
    f19_c5_edges = [f17.edges().sort_by_distance(p)[0] for p in [
        (-133.6621306837, -84.4966906275, 0),
    ]]
    f19_c5_side = f17.faces().sort_by_distance((-133.6621306837, -84.3966906275, 0))[0]
    chamfer(f19_c5_edges, length=F19_C5_SIZE, length2=F19_C5_SIZE2, reference=f19_c5_side)

    # F19_c6
    f19_c6_edges = [f17.edges().sort_by_distance(p)[0] for p in [
        (-171.1621306837, -49.4966906275, 75),
    ]]
    f19_c6_side = f17.faces().sort_by_distance((-171.1621306837, -49.4966906275, 74.9))[0]
    chamfer(f19_c6_edges, length=F19_C6_SIZE, length2=F19_C6_SIZE2, reference=f19_c6_side)

    # F19_c7
    f19_c7_edges = [f17.edges().sort_by_distance(p)[0] for p in [
        (-133.6621306837, -84.4966906275, 75),
    ]]
    f19_c7_side = f17.faces().sort_by_distance((-133.6621306837, -84.4966906275, 74.9))[0]
    chamfer(f19_c7_edges, length=F19_C7_SIZE, length2=F19_C7_SIZE2, reference=f19_c7_side)

    # F20 (on face) → F21 (join)
    with BuildSketch(Plane(origin=(-171.1621306837, 0, 0), x_dir=(0, -1, 0), z_dir=(-1, 0, 0))):
        with Locations((46.9966906275, 37.5)):
            Circle(F20_R)
    extrude(amount=F21_DEPTH, taper=F21_TAPER)

    # F22 (on face) → F23 (join)
    with BuildSketch(Plane(origin=(0, 0, 0), x_dir=(1, 0, 0), z_dir=(0, 0, -1))):
        with Locations((-133.6621306837, 46.9966906275)):
            Circle(F22_R)
    extrude(amount=F23_DEPTH)

    # F24 (on face) → F25 (join)
    with BuildSketch(Plane(origin=(0, 0, -88), x_dir=(1, 0, 0), z_dir=(0, 0, -1))):
        with Locations((-133.6621306837, 46.9966906275)):
            Circle(F24_R)
    extrude(amount=F25_DEPTH)

    # F26 (on face) → F27 (join)
    with BuildSketch(Plane(origin=(0, 0, -96), x_dir=(1, 0, 0), z_dir=(0, 0, -1))):
        with Locations((-133.6621306837, 46.9966906275)):
            Circle(F26_R)
    extrude(amount=F27_DEPTH)


solid = Compound([f1.part, f6.part, f17.part])
